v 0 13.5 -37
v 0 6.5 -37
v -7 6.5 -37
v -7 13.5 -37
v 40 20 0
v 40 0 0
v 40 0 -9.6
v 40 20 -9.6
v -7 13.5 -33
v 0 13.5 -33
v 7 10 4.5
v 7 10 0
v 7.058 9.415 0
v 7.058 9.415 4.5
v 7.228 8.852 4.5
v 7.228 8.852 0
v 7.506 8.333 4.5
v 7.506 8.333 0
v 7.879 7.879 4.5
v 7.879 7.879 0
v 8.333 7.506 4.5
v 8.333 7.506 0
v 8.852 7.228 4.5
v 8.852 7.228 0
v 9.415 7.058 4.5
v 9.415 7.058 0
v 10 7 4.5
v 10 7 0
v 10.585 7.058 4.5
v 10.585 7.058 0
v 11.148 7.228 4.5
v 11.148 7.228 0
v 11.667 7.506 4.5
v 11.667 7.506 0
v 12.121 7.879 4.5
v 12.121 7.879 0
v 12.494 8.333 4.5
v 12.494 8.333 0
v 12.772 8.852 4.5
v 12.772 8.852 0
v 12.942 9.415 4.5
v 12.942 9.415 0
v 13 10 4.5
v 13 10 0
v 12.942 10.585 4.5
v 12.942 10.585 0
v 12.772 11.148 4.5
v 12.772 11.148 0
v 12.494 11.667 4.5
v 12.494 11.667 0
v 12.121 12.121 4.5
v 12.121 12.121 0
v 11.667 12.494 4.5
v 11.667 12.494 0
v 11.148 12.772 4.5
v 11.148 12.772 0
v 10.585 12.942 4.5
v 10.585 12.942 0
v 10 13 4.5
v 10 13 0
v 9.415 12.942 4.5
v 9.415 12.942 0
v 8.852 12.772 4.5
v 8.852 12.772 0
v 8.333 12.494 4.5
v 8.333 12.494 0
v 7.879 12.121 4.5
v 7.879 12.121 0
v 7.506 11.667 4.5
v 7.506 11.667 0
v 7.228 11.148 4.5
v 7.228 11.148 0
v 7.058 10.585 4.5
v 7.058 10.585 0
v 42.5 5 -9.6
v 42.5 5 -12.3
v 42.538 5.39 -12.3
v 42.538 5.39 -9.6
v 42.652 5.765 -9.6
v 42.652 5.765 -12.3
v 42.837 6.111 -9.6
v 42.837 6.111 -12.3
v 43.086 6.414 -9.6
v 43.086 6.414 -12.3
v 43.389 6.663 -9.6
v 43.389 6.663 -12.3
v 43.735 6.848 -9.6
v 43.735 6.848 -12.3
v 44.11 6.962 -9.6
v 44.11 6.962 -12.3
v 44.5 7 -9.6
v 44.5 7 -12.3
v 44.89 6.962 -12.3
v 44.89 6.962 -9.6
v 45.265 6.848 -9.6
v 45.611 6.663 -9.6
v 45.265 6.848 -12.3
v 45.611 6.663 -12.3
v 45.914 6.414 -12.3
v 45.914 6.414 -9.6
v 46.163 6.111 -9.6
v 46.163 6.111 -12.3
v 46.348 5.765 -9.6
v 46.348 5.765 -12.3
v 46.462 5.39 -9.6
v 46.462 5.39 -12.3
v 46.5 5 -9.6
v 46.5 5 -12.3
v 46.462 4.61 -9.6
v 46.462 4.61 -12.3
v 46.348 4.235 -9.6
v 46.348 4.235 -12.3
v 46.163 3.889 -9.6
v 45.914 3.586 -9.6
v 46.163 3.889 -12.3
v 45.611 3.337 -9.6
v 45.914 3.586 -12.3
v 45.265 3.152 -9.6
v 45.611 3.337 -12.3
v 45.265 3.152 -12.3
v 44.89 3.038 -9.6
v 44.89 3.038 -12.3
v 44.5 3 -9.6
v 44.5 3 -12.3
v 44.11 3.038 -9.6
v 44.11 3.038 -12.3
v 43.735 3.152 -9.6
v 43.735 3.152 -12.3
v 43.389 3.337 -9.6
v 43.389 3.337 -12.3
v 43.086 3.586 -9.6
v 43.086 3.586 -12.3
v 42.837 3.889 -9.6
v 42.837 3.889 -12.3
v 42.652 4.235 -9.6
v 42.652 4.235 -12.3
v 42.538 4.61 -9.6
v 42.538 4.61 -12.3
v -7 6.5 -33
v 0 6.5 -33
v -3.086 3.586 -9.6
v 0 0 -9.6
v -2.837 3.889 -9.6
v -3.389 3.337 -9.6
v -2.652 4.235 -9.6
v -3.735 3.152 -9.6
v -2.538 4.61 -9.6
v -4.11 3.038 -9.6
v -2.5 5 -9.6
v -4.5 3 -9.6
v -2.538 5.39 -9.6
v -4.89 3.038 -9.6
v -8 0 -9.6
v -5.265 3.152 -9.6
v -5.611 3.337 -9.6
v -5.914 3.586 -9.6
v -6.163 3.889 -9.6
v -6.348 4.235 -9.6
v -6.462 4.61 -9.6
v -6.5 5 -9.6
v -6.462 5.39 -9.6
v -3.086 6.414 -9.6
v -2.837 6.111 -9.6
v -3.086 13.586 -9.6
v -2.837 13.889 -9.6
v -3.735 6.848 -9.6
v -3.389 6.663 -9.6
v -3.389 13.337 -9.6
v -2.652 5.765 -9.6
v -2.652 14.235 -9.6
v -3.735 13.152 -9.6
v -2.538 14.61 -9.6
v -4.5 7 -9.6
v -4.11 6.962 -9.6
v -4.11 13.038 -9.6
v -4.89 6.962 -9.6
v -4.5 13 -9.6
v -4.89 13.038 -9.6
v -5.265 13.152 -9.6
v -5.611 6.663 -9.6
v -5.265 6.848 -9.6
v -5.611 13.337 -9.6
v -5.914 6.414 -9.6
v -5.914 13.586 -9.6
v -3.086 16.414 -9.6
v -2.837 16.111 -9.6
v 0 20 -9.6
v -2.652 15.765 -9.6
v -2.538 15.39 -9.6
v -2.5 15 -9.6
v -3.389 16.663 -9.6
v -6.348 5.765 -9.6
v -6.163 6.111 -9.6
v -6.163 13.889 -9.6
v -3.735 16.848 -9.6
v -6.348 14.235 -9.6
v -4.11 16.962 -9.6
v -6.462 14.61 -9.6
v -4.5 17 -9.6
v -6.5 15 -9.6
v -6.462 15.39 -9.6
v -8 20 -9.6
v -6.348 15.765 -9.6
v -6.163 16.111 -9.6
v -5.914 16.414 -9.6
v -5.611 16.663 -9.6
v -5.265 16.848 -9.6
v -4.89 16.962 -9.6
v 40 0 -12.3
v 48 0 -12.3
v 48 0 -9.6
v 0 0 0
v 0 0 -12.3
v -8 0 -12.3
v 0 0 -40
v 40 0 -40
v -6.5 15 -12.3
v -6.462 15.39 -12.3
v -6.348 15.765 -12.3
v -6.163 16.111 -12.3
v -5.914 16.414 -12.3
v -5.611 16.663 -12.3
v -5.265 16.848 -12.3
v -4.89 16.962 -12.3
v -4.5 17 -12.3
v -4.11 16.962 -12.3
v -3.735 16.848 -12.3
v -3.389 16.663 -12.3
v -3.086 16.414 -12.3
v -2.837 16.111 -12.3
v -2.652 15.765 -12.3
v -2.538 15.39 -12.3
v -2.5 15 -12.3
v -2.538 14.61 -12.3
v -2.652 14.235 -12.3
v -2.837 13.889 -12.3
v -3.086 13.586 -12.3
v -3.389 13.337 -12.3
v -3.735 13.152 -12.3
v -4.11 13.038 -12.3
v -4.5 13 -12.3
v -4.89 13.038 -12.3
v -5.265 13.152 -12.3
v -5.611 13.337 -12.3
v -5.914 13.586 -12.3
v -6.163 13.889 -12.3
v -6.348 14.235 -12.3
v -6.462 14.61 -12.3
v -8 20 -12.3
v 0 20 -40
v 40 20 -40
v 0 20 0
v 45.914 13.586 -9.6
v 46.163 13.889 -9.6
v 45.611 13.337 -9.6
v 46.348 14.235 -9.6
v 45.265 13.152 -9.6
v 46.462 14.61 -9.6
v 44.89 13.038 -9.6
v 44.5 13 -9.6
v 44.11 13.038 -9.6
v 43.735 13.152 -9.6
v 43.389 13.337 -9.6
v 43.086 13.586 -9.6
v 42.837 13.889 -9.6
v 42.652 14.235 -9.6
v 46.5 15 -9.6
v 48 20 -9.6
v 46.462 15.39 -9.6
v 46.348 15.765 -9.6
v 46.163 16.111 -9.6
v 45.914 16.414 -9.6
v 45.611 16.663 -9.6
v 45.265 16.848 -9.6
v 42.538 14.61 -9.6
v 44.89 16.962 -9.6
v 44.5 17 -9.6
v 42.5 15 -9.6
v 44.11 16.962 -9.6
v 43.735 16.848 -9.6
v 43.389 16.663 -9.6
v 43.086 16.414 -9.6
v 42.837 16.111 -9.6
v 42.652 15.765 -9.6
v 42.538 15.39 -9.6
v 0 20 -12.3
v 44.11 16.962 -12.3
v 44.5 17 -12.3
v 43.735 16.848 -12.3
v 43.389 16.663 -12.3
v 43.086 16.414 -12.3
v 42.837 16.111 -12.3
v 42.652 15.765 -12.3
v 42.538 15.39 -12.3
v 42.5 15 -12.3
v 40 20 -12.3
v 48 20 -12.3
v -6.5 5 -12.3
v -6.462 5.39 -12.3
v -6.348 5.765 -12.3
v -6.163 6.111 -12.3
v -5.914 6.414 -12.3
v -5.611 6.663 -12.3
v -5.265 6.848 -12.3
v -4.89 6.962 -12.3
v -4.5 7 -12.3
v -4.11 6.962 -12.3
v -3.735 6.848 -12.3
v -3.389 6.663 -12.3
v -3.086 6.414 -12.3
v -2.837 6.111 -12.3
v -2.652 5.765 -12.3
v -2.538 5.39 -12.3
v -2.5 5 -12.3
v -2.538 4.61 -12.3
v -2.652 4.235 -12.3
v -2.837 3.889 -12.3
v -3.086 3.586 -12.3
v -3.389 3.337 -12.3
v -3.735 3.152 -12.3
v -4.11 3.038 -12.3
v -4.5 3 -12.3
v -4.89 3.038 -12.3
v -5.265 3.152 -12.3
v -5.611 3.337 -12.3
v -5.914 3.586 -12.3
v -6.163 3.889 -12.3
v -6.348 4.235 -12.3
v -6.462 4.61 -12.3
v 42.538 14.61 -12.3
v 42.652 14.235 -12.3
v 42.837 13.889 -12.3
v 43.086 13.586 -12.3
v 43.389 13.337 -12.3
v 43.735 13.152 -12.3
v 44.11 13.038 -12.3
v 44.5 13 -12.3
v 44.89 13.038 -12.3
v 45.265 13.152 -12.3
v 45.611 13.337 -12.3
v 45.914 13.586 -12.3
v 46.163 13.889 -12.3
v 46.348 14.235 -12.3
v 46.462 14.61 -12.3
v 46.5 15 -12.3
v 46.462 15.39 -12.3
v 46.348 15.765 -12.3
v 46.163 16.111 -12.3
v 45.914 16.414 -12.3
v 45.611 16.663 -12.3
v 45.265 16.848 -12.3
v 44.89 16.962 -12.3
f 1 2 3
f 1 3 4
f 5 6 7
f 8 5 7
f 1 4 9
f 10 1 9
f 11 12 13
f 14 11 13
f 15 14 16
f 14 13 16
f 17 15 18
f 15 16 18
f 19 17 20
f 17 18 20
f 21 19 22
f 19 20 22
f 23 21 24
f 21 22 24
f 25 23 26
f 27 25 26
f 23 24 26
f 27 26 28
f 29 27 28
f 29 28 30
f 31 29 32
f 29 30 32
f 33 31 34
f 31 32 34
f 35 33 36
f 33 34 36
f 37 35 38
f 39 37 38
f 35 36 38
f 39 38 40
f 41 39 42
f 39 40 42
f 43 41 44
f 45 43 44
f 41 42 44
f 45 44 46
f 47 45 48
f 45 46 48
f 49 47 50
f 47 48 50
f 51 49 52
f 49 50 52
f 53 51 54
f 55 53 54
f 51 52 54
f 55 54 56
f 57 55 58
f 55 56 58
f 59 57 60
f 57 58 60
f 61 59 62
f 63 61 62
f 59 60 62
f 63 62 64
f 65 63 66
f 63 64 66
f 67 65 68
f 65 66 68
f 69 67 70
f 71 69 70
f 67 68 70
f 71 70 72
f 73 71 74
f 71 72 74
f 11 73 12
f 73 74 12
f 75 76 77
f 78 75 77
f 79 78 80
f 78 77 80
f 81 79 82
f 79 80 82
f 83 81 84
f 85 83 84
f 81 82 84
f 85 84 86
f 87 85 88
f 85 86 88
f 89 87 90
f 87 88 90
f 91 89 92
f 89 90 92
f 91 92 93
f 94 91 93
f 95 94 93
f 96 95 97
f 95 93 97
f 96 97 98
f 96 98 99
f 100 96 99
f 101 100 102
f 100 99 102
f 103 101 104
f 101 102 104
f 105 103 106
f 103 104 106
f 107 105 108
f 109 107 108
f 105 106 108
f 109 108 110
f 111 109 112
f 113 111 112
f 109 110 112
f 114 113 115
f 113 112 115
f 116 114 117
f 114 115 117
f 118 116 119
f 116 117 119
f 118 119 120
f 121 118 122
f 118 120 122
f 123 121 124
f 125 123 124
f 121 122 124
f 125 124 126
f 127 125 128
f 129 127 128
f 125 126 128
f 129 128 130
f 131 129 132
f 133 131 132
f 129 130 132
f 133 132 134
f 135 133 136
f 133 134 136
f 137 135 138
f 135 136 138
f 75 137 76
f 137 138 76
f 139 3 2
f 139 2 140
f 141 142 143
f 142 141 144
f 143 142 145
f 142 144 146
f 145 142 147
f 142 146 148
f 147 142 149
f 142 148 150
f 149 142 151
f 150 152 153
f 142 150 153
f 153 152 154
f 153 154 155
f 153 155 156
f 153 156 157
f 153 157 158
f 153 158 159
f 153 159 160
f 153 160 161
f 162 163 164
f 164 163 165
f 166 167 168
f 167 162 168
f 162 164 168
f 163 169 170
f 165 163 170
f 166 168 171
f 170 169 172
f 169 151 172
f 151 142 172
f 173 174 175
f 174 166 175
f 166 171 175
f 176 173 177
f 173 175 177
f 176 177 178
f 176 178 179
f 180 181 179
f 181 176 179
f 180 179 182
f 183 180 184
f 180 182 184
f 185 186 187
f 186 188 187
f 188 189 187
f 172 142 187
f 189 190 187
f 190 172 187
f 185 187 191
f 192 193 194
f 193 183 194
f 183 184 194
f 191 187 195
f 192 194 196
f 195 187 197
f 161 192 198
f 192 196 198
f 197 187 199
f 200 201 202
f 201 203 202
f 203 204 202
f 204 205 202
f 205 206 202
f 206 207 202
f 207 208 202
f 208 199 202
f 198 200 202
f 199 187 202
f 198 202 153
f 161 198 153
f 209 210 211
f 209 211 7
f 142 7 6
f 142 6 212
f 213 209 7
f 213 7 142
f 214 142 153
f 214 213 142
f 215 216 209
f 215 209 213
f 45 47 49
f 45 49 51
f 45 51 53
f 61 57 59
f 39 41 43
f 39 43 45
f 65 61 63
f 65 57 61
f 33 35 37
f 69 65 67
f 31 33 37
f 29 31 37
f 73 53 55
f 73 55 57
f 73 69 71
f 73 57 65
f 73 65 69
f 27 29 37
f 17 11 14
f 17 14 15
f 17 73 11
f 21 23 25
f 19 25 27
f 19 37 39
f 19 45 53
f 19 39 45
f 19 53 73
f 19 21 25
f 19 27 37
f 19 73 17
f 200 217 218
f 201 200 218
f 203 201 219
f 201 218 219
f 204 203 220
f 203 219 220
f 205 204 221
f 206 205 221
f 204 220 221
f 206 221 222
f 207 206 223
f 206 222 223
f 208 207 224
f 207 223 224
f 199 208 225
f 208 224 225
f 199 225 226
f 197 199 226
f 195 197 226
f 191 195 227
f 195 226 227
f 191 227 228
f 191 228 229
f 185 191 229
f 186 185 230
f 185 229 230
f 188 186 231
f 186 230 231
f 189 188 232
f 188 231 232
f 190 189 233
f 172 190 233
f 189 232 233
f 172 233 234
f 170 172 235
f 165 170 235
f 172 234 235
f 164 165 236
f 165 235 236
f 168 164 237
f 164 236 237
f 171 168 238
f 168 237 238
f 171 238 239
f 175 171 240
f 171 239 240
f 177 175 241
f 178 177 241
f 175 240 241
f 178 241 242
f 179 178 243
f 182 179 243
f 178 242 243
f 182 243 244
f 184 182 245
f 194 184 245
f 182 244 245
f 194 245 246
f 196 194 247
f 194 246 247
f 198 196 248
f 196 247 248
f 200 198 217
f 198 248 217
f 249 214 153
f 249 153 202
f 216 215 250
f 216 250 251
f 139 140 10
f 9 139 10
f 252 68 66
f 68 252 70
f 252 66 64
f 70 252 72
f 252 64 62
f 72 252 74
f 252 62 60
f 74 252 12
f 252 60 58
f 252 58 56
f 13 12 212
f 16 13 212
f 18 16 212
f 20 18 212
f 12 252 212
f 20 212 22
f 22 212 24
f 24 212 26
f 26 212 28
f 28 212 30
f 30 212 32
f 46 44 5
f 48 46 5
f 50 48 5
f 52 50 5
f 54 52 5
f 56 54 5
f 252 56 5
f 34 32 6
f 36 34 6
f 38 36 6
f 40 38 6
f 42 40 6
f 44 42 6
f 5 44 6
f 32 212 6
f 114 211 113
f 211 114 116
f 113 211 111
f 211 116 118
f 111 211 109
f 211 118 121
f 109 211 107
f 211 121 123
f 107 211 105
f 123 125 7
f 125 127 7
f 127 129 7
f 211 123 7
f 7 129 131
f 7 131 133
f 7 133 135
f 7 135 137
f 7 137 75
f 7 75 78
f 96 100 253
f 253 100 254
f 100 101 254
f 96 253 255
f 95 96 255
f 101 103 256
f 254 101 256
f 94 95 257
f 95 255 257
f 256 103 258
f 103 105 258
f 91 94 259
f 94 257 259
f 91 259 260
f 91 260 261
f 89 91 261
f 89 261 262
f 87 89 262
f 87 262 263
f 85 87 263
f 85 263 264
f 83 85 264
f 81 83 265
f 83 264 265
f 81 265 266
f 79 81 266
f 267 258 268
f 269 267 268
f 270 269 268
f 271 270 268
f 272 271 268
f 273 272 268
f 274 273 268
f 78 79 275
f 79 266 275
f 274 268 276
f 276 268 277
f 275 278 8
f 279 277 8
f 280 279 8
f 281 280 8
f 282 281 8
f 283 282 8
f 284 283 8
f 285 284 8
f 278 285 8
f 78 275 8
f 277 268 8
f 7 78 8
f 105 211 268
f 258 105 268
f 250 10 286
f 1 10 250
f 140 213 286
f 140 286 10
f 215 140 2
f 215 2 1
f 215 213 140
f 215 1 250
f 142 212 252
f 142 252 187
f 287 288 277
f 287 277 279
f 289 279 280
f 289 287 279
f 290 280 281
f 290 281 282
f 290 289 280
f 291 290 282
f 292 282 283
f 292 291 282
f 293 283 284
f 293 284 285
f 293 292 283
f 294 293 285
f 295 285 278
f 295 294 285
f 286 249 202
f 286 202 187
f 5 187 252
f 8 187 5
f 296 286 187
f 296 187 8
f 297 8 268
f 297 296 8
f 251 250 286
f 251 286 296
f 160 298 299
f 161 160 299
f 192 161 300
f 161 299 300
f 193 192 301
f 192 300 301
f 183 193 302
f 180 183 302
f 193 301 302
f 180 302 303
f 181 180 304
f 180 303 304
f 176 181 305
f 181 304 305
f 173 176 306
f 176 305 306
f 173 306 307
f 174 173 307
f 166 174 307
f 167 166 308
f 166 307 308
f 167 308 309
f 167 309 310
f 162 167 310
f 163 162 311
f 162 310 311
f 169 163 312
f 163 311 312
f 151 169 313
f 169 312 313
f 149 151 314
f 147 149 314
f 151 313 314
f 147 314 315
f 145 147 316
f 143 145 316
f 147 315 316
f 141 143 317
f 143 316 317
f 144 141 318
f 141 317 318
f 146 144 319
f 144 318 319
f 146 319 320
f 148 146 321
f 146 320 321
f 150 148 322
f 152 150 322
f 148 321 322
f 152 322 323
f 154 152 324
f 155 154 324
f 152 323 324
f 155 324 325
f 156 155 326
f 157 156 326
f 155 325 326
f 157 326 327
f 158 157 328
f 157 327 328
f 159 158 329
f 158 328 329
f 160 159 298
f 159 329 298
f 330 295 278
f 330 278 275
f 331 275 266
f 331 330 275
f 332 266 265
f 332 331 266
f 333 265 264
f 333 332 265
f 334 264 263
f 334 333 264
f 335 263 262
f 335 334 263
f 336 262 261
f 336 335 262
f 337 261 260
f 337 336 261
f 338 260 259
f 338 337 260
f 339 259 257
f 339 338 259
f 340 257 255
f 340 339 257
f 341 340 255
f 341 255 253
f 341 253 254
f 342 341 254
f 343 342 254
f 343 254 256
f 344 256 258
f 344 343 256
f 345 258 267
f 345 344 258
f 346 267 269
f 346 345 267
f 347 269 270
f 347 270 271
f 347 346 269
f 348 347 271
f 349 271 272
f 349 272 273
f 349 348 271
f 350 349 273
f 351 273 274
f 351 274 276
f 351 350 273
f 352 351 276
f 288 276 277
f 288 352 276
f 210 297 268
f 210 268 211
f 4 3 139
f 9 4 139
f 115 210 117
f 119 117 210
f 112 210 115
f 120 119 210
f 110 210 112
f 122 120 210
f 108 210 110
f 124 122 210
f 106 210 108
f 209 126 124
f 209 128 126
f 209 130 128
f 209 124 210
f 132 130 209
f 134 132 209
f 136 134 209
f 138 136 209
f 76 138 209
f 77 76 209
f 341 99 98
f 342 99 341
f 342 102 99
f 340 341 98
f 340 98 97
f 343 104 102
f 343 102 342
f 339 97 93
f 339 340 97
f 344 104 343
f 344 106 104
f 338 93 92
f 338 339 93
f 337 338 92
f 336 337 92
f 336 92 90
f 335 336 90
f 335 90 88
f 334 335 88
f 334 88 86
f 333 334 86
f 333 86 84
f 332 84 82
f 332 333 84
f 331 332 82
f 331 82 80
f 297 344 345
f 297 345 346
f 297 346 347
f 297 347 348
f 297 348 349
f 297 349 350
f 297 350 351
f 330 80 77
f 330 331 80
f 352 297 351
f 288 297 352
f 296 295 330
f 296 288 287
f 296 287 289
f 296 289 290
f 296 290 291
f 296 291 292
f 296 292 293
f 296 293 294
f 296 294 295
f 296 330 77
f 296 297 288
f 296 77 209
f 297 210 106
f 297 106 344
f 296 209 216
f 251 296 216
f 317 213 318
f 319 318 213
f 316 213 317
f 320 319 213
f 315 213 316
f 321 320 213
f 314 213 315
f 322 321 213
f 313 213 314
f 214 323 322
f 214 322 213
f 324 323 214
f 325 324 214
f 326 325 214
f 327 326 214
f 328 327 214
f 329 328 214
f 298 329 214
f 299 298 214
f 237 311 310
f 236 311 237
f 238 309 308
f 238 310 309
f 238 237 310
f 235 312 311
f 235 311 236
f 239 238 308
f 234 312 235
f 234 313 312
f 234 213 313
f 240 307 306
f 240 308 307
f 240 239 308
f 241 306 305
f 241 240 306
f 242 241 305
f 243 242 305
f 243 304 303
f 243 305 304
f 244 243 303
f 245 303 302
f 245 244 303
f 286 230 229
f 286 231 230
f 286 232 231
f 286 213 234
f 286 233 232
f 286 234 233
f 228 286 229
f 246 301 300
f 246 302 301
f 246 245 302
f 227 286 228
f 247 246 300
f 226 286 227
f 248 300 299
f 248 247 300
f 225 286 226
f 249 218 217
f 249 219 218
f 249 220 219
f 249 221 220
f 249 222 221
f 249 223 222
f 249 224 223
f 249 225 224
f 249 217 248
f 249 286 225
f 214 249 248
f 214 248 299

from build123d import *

# Parameters (mm, degrees)
SKETCH_1_W      = 40
SKETCH_1_H      = 40
EXTRUDE_1_DEPTH = 20
SKETCH_2_R      = 3
EXTRUDE_2_DEPTH = 4.5
SKETCH_4_R      = 2
SKETCH_4_W      = 8
SKETCH_4_H      = 20
EXTRUDE_4_DEPTH = 2.7
SKETCH_5_W      = 4
SKETCH_5_H      = 7
EXTRUDE_5_DEPTH = 7


with BuildPart() as part:
    # 草图1 → 凸台-拉伸1 (new body)
    with BuildSketch(Plane(origin=(0, 0, 0), x_dir=(1, 0, 0), z_dir=(0, 1, 0))):
        with Locations((20, 20)):
            Rectangle(SKETCH_1_W, SKETCH_1_H)
    extrude(amount=EXTRUDE_1_DEPTH)

    # 草图2 → 凸台-拉伸2 (add)
    with BuildSketch(Plane.XY):
        with Locations(Location((10, 10, 0), (0, 0, 180))):
            Circle(SKETCH_2_R)
    extrude(amount=EXTRUDE_2_DEPTH)

    # 草图4 → 凸台-拉伸4 (add)
    # profile 1 of 3: a face of its own
    with BuildSketch(Plane(origin=(0, 0, -12.3), x_dir=(-1, 0, 0), z_dir=(0, 0, -1))):
        with BuildLine():
            Line((-44.5, 17), (-44.5, 20))
            Line((-44.5, 20), (-48, 20))
            Line((-48, 20), (-48, 0))
            Line((-48, 0), (-40, 0))
            Line((-40, 0), (-40, 15))
            Line((-40, 15), (-42.5, 15))
            ThreePointArc((-42.5, 15), (-45.914213562, 13.585786438), (-44.5, 17))
        make_face()
        with Locations((-44.5, 5)):
            Circle(SKETCH_4_R, mode=Mode.SUBTRACT)
    # profile 2 of 3: a face of its own
    with BuildSketch(Plane(origin=(0, 0, -12.3), x_dir=(-1, 0, 0), z_dir=(0, 0, -1))):
        with BuildLine():
            Line((-40, 15), (-40, 20))
            Line((-40, 20), (-44.5, 20))
            Line((-44.5, 20), (-44.5, 17))
            ThreePointArc((-44.5, 17), (-43.085786438, 16.414213562), (-42.5, 15))
            Line((-42.5, 15), (-40, 15))
        make_face()
    # profile 3 of 3: a face of its own
    with BuildSketch(Plane(origin=(0, 0, -12.3), x_dir=(-1, 0, 0), z_dir=(0, 0, -1))):
        with Locations((4, 10)):
            Rectangle(SKETCH_4_W, SKETCH_4_H)
        with Locations((4.5, 5)):
            Circle(SKETCH_4_R, mode=Mode.SUBTRACT)
        with Locations((4.5, 15)):
            Circle(SKETCH_4_R, mode=Mode.SUBTRACT)
    extrude(amount=-EXTRUDE_4_DEPTH)

    # 草图5 → 凸台-拉伸5 (add)
    with BuildSketch(Plane.ZY):
        with Locations((-35, 10)):
            Rectangle(SKETCH_5_W, SKETCH_5_H)
    extrude(amount=EXTRUDE_5_DEPTH)


solid = part.part
